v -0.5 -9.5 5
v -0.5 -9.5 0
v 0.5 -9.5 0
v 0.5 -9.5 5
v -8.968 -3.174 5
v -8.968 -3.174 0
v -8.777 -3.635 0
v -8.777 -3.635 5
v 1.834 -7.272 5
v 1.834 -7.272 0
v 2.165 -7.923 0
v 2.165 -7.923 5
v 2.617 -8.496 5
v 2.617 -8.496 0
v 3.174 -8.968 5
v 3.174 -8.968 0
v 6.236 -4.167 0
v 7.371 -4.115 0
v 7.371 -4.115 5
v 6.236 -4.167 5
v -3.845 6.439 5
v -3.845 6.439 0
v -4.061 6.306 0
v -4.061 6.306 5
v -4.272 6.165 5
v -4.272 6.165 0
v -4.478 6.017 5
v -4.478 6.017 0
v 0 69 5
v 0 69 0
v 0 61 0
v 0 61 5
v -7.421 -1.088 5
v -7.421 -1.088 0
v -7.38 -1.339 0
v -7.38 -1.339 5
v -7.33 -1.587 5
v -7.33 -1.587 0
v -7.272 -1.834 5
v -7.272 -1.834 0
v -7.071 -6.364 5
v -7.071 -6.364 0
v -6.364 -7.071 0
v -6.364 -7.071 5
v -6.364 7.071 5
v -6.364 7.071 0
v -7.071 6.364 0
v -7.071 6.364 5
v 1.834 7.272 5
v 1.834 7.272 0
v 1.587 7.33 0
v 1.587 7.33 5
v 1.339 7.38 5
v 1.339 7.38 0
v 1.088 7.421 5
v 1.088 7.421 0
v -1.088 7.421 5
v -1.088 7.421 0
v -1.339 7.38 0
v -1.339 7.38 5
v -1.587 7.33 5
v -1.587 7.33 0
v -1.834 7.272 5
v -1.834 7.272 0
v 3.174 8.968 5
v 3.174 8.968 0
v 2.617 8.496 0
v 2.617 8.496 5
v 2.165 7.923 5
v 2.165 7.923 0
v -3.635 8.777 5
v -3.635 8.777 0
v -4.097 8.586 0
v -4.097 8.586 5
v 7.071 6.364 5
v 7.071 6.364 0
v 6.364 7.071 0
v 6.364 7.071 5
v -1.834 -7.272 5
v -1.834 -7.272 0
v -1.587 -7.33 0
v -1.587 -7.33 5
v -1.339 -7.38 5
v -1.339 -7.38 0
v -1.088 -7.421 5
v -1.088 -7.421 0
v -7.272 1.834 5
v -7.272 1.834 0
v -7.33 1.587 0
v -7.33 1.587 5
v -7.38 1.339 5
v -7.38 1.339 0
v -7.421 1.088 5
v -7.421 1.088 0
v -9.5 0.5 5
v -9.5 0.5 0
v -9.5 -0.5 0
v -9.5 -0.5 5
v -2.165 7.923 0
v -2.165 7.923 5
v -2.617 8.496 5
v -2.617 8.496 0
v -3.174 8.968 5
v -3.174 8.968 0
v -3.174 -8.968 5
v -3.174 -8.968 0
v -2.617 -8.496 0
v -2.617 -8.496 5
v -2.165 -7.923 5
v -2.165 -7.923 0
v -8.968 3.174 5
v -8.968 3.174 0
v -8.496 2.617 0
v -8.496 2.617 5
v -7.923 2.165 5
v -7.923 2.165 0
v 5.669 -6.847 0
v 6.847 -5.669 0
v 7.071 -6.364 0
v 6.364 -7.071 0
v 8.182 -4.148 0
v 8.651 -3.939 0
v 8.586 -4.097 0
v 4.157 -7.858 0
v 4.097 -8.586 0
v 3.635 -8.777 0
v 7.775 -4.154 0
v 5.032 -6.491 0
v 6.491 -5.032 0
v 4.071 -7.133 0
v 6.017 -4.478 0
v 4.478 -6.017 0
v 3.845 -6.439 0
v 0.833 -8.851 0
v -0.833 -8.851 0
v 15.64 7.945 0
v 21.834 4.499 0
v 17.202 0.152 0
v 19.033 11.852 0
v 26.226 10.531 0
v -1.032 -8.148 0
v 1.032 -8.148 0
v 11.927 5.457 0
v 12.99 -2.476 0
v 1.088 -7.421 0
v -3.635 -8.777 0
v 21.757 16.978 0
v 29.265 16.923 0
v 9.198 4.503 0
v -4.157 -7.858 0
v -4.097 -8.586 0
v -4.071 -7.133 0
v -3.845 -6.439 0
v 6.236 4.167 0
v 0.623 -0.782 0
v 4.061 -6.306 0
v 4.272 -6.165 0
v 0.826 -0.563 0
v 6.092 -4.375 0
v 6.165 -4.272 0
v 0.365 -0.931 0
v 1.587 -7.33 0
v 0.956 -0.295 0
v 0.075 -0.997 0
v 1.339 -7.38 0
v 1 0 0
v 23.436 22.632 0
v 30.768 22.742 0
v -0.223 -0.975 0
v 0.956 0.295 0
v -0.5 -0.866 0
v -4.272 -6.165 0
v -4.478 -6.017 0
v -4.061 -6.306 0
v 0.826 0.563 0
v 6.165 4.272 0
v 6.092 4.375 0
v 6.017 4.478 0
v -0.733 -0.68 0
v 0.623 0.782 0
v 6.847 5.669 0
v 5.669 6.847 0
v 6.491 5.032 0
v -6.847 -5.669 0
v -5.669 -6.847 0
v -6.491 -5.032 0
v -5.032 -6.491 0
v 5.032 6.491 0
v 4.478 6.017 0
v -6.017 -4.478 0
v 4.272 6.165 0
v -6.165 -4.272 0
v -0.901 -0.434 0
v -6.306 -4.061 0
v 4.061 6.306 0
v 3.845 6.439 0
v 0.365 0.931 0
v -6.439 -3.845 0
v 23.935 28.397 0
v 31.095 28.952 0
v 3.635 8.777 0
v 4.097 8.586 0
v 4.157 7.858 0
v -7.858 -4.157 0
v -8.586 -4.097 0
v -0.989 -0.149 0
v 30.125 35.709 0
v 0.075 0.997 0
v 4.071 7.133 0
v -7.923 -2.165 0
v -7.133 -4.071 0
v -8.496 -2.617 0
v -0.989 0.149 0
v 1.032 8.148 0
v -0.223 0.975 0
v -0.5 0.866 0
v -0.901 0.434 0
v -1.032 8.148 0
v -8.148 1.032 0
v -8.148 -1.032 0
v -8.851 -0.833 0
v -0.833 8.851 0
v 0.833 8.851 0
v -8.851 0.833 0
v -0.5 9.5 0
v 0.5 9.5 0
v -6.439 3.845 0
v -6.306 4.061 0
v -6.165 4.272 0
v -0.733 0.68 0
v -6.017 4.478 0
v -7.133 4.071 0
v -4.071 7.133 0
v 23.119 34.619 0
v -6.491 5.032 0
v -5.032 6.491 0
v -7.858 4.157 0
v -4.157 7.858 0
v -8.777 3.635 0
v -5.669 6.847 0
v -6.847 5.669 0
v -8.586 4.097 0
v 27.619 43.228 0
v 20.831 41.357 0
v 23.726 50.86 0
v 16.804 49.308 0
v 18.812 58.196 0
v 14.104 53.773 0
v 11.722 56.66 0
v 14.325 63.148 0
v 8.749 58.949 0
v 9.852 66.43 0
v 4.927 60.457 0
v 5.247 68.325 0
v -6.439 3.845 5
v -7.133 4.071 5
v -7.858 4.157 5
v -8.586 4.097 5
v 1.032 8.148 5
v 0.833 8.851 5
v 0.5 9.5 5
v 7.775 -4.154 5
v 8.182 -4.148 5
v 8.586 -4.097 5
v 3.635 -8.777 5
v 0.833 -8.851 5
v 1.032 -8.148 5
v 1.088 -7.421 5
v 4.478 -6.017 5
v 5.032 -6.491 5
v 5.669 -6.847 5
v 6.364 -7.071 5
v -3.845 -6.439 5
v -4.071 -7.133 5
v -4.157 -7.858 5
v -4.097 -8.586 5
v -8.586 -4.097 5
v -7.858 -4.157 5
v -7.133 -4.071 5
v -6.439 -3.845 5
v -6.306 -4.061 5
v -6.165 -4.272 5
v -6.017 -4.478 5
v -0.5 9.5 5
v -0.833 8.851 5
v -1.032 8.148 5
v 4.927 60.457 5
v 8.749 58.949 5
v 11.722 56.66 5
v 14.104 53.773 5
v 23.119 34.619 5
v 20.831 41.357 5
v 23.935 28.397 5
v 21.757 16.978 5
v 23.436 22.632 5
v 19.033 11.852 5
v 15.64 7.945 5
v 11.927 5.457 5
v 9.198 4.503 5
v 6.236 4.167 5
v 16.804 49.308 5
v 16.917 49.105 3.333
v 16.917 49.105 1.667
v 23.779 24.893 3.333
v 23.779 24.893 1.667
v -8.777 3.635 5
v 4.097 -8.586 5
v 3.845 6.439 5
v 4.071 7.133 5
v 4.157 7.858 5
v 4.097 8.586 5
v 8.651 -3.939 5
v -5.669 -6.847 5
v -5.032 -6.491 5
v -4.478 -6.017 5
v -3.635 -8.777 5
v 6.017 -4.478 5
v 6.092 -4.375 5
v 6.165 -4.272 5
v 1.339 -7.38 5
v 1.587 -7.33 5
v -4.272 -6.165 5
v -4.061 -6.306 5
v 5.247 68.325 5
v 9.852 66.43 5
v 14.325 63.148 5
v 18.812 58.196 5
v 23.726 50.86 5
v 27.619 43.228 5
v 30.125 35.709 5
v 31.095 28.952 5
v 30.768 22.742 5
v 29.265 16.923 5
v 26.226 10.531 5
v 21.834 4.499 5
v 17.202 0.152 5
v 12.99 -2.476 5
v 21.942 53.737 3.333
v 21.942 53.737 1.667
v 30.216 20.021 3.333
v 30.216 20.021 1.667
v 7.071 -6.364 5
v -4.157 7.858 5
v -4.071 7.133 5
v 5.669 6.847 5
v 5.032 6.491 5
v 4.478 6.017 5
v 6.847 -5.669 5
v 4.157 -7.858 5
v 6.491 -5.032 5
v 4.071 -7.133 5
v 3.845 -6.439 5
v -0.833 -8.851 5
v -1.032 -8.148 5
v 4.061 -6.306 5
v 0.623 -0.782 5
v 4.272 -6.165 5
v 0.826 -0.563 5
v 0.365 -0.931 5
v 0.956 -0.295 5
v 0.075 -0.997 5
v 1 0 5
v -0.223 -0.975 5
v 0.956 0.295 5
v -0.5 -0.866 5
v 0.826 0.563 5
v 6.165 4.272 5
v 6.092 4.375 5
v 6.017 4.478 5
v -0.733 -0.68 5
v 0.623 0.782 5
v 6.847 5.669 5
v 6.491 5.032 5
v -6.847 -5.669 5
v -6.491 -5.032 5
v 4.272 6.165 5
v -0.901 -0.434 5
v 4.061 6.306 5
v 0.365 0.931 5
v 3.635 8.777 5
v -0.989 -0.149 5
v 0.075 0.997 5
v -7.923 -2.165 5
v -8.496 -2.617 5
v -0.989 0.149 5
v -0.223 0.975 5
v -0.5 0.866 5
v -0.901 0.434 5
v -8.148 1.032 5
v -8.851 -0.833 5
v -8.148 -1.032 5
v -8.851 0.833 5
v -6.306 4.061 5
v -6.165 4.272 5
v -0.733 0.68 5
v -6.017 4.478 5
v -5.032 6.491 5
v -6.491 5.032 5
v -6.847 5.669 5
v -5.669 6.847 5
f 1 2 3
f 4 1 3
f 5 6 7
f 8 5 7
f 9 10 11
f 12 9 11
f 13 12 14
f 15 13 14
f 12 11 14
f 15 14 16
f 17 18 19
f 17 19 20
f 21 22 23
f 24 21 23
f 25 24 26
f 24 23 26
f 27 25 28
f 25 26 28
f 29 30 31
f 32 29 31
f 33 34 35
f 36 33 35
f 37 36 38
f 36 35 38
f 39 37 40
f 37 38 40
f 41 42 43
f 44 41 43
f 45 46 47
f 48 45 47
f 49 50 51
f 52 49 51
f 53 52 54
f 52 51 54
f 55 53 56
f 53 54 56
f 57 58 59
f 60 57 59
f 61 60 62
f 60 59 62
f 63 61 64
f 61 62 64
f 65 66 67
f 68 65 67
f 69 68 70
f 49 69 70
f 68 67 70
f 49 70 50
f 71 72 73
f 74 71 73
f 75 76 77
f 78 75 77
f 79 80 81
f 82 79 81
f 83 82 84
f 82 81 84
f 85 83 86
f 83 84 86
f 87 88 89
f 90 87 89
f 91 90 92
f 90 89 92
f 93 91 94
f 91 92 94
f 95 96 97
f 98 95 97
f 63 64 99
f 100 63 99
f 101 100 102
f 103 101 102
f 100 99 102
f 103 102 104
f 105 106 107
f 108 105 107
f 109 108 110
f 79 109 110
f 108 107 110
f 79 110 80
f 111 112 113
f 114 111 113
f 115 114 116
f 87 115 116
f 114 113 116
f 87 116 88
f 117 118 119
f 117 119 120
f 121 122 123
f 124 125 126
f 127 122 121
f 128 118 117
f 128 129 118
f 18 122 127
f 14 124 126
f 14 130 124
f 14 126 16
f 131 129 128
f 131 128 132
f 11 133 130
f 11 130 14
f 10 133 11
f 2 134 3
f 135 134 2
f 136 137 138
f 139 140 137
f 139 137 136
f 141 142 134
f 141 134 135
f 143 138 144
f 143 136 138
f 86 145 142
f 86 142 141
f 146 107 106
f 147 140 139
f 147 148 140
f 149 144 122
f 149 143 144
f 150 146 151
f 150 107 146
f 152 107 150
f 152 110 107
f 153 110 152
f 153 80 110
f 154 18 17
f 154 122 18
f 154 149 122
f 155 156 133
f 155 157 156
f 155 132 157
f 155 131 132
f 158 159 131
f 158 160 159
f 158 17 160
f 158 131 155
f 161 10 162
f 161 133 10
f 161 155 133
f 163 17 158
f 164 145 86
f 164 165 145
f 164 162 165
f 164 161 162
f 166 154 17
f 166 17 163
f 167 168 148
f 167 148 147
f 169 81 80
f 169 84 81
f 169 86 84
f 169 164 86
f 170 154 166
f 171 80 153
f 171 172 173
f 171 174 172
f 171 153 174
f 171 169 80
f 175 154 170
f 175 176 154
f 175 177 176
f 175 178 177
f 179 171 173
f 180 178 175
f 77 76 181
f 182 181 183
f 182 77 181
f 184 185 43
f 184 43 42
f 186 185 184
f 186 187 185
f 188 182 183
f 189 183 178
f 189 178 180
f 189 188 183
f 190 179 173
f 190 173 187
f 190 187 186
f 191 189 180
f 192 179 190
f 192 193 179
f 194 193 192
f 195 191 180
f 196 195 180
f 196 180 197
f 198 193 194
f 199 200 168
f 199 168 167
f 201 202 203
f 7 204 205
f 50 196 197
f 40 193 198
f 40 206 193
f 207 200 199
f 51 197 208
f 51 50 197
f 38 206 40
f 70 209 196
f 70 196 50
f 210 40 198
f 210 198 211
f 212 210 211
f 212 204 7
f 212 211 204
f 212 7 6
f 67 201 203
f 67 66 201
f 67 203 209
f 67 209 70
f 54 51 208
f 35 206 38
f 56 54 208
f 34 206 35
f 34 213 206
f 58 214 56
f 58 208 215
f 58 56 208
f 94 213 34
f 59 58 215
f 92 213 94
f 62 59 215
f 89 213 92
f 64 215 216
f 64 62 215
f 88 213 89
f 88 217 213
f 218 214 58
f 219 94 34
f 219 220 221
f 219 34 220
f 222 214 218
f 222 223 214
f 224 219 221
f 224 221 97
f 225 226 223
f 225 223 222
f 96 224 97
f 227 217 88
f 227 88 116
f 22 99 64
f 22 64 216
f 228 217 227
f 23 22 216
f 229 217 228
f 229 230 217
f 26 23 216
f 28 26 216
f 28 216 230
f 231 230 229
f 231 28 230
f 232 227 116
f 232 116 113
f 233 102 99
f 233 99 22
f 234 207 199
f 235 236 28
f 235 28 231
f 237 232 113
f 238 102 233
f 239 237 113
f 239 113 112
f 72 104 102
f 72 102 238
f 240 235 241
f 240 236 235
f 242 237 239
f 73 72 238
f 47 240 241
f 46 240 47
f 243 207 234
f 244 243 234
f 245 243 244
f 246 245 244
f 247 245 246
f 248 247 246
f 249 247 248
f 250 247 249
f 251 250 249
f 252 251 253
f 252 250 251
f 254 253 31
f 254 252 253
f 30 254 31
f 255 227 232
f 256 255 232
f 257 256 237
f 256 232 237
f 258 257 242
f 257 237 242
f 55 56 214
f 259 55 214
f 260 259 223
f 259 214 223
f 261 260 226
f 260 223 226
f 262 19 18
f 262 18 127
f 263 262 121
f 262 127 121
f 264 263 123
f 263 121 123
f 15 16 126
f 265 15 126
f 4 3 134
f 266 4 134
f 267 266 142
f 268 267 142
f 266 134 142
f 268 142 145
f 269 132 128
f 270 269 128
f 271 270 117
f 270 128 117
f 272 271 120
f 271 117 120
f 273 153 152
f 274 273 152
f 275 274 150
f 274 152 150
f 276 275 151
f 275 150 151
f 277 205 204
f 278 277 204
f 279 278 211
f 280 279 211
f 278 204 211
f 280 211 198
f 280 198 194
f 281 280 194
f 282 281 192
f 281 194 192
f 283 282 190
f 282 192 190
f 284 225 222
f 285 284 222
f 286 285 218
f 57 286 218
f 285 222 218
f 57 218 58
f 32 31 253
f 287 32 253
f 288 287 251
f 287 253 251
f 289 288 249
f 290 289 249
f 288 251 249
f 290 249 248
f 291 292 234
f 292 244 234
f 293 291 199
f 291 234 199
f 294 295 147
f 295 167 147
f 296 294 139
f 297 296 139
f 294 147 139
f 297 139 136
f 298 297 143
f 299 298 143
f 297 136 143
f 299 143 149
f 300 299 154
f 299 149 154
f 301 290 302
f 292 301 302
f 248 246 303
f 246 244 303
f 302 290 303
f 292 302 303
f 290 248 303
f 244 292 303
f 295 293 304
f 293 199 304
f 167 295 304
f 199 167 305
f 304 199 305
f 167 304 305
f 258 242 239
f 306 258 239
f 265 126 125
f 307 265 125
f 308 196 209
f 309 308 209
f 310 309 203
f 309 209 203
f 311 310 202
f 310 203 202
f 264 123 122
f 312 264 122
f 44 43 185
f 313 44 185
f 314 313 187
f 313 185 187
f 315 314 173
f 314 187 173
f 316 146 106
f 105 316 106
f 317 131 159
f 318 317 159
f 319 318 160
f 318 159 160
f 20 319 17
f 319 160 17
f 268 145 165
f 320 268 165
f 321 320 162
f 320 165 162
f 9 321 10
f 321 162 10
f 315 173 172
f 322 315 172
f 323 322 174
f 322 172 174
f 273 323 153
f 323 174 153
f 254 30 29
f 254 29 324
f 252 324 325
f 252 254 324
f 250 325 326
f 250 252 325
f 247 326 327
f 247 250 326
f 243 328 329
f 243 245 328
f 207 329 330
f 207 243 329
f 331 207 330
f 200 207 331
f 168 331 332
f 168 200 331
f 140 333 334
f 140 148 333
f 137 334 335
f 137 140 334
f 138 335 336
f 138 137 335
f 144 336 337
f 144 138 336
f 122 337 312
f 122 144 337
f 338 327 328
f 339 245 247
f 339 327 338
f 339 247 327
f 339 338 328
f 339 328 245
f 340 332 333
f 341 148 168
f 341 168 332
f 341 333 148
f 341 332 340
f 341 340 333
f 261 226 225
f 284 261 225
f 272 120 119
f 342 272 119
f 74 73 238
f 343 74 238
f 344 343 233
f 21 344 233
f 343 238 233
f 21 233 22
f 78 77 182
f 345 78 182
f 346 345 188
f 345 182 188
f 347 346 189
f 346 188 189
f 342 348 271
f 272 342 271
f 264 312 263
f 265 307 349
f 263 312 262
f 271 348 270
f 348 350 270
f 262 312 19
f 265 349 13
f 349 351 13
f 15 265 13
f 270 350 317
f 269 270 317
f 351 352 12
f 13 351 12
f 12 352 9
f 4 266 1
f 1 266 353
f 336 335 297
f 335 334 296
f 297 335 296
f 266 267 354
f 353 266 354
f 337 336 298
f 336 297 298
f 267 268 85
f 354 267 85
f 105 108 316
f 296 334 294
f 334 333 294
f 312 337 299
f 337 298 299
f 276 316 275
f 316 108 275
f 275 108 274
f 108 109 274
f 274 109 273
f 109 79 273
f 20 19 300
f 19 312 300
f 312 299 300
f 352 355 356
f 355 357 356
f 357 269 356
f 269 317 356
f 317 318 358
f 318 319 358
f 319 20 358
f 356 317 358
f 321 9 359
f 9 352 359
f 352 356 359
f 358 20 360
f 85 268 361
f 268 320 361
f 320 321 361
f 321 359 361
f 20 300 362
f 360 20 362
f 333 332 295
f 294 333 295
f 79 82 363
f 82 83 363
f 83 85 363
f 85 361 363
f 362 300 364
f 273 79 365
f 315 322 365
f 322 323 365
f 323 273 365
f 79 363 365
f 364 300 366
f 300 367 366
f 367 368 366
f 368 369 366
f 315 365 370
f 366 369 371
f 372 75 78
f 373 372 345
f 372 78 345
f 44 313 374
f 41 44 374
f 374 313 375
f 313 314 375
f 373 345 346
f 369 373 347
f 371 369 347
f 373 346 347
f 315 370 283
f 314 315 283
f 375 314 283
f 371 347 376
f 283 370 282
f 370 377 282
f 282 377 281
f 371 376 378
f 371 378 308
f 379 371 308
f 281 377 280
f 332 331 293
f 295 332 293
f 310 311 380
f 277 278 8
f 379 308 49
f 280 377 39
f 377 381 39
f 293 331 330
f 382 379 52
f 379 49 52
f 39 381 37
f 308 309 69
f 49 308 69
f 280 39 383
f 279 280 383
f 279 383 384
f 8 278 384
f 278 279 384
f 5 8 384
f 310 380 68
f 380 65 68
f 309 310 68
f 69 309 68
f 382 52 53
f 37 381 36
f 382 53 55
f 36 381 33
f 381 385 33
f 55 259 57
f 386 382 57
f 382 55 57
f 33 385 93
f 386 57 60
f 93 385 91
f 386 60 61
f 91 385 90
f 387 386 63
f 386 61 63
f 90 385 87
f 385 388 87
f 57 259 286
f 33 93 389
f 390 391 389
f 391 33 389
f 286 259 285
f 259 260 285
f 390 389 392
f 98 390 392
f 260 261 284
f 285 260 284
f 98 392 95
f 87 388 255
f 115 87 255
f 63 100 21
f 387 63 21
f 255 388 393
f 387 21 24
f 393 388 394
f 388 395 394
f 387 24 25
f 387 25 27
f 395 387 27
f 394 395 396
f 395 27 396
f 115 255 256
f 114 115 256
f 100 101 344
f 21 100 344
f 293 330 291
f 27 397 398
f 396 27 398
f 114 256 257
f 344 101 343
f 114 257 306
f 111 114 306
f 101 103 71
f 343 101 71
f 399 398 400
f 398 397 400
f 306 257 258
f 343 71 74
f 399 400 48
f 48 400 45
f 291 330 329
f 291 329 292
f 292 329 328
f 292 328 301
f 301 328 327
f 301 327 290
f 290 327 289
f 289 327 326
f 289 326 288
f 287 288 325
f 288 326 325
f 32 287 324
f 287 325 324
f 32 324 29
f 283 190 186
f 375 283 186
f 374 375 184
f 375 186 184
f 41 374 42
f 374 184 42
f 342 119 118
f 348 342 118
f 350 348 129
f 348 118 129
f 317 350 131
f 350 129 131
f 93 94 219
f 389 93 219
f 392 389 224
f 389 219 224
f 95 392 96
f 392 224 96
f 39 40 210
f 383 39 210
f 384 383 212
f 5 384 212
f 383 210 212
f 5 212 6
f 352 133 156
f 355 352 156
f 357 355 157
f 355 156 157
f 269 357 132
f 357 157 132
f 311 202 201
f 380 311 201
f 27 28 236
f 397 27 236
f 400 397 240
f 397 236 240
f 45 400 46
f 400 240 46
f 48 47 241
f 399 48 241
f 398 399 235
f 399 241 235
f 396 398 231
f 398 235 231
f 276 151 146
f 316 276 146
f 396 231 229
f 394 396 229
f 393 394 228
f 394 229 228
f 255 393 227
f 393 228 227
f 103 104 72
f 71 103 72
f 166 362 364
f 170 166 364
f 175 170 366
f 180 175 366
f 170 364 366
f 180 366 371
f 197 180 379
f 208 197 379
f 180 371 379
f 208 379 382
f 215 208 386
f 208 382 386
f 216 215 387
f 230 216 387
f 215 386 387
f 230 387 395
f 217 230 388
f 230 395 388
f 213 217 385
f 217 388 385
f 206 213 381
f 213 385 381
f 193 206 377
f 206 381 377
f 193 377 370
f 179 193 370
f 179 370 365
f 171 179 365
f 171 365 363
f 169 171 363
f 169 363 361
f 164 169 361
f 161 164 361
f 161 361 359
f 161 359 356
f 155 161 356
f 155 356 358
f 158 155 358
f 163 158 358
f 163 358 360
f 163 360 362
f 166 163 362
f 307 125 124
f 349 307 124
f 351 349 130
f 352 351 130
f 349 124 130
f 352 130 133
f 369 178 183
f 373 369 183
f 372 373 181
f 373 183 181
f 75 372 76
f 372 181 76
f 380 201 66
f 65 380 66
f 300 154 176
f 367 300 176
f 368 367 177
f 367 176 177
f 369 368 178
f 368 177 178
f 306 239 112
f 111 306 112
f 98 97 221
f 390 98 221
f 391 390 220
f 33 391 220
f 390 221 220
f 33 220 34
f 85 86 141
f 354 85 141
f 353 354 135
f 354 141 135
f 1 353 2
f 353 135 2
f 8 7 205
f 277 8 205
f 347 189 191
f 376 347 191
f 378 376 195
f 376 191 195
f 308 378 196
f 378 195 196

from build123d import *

# Parameters (mm, degrees)
F1_DEPTH = 5
F2_R     = 1
F3_DEPTH = 5.001
F5_DEPTH = 5


with BuildPart() as f1:
    # F0 (on Top) → F1 (new body)
    with BuildSketch(Plane.XY):
        with BuildLine():
            ThreePointArc((7.4206173165, -1.0883191822), (7.4801280027, -0.5456052265), (7.5, 0))
            ThreePointArc((7.5, 0), (7.4801280027, 0.5456052265), (7.4206173165, 1.0883191822))
            ThreePointArc((7.4206173165, 1.0883191822), (7.355889603, 1.4631774151), (7.2722381774, 1.8342714877))
            ThreePointArc((7.2722381774, 1.8342714877), (6.9290964938, 2.8701257427), (6.4392747372, 3.8452231222))
            ThreePointArc((6.4392747372, 3.8452231222), (6.2360220923, 4.1667767476), (6.0167266989, 4.4776109513))
            ThreePointArc((6.0167266989, 4.4776109513), (5.3033008589, 5.3033008589), (4.4776109513, 6.0167266989))
            ThreePointArc((4.4776109513, 6.0167266989), (4.1667767476, 6.2360220923), (3.8452231222, 6.4392747372))
            ThreePointArc((3.8452231222, 6.4392747372), (2.8701257427, 6.9290964938), (1.8342714877, 7.2722381774))
            ThreePointArc((1.8342714877, 7.2722381774), (1.4631774151, 7.355889603), (1.0883191822, 7.4206173165))
            ThreePointArc((1.0883191822, 7.4206173165), (0, 7.5), (-1.0883191822, 7.4206173165))
            ThreePointArc((-1.0883191822, 7.4206173165), (-1.4631774151, 7.355889603), (-1.8342714877, 7.2722381774))
            ThreePointArc((-1.8342714877, 7.2722381774), (-2.8701257427, 6.9290964938), (-3.8452231222, 6.4392747372))
            ThreePointArc((-3.8452231222, 6.4392747372), (-4.1667767476, 6.2360220923), (-4.4776109513, 6.0167266989))
            ThreePointArc((-4.4776109513, 6.0167266989), (-5.3033008589, 5.3033008589), (-6.0167266989, 4.4776109513))
            ThreePointArc((-6.0167266989, 4.4776109513), (-6.2360220923, 4.1667767476), (-6.4392747372, 3.8452231222))
            ThreePointArc((-6.4392747372, 3.8452231222), (-6.9290964938, 2.8701257427), (-7.2722381774, 1.8342714877))
            ThreePointArc((-7.2722381774, 1.8342714877), (-7.355889603, 1.4631774151), (-7.4206173165, 1.0883191822))
            ThreePointArc((-7.4206173165, 1.0883191822), (-7.5, 0), (-7.4206173165, -1.0883191822))
            ThreePointArc((-7.4206173165, -1.0883191822), (-7.355889603, -1.4631774151), (-7.2722381774, -1.8342714877))
            ThreePointArc((-7.2722381774, -1.8342714877), (-6.9290964938, -2.8701257427), (-6.4392747372, -3.8452231222))
            ThreePointArc((-6.4392747372, -3.8452231222), (-6.2360220923, -4.1667767476), (-6.0167266989, -4.4776109513))
            ThreePointArc((-6.0167266989, -4.4776109513), (-5.3033008589, -5.3033008589), (-4.4776109513, -6.0167266989))
            ThreePointArc((-4.4776109513, -6.0167266989), (-4.1667767476, -6.2360220923), (-3.8452231222, -6.4392747372))
            ThreePointArc((-3.8452231222, -6.4392747372), (-2.8701257427, -6.9290964938), (-1.8342714877, -7.2722381774))
            ThreePointArc((-1.8342714877, -7.2722381774), (-1.4631774151, -7.355889603), (-1.0883191822, -7.4206173165))
            ThreePointArc((-1.0883191822, -7.4206173165), (0, -7.5), (1.0883191822, -7.4206173165))
            ThreePointArc((1.0883191822, -7.4206173165), (1.4631774151, -7.355889603), (1.8342714877, -7.2722381774))
            ThreePointArc((1.8342714877, -7.2722381774), (2.8701257427, -6.9290964938), (3.8452231222, -6.4392747372))
            ThreePointArc((3.8452231222, -6.4392747372), (4.1667767476, -6.2360220923), (4.4776109513, -6.0167266989))
            ThreePointArc((4.4776109513, -6.0167266989), (5.3033008589, -5.3033008589), (6.0167266989, -4.4776109513))
            ThreePointArc((6.0167266989, -4.4776109513), (6.2360220923, -4.1667767476), (6.4392747372, -3.8452231222))
            ThreePointArc((6.4392747372, -3.8452231222), (6.9290964938, -2.8701257427), (7.2722381774, -1.8342714877))
            ThreePointArc((7.2722381774, -1.8342714877), (7.355889603, -1.4631774151), (7.4206173165, -1.0883191822))
        make_face()
        with BuildLine():
            ThreePointArc((7.4206173165, 1.0883191822), (7.4801280027, 0.5456052265), (7.5, 0))
            ThreePointArc((7.5, 0), (7.4801280027, -0.5456052265), (7.4206173165, -1.0883191822))
            ThreePointArc((7.4206173165, -1.0883191822), (8.5043518229, -0.9498278009), (9.5, -0.5))
            Line((9.5, -0.5), (9.5, 0))
            Line((9.5, 0), (9.5, 0.5))
            ThreePointArc((9.5, 0.5), (8.5043518229, 0.9498278009), (7.4206173165, 1.0883191822))
        make_face()
        with BuildLine():
            ThreePointArc((6.4392747372, 3.8452231222), (6.9290964938, 2.8701257427), (7.2722381774, 1.8342714877))
            ThreePointArc((7.2722381774, 1.8342714877), (8.2204799494, 2.376948081), (8.968197275, 3.1735528412))
            Line((8.968197275, 3.1735528412), (8.7768555589, 3.6354926075))
            Line((8.7768555589, 3.6354926075), (8.5855138427, 4.0974323737))
            ThreePointArc((8.5855138427, 4.0974323737), (7.4935132234, 4.1320010103), (6.4392747372, 3.8452231222))
        make_face()
        with BuildLine():
            ThreePointArc((8.968197275, -3.1735528412), (8.2204799494, -2.376948081), (7.2722381774, -1.8342714877))
            ThreePointArc((7.2722381774, -1.8342714877), (6.9290964938, -2.8701257427), (6.4392747372, -3.8452231222))
            ThreePointArc((6.4392747372, -3.8452231222), (7.4935132234, -4.1320010103), (8.5855138427, -4.0974323737))
            Line((8.5855138427, -4.0974323737), (8.7768555589, -3.6354926075))
            Line((8.7768555589, -3.6354926075), (8.968197275, -3.1735528412))
        make_face()
        with BuildLine():
            ThreePointArc((4.4776109513, 6.0167266989), (5.3033008589, 5.3033008589), (6.0167266989, 4.4776109513))
            ThreePointArc((6.0167266989, 4.4776109513), (6.6851145225, 5.3418551646), (7.0710678119, 6.3639610307))
            Line((7.0710678119, 6.3639610307), (6.7175144213, 6.7175144213))
            Line((6.7175144213, 6.7175144213), (6.3639610307, 7.0710678119))
            ThreePointArc((6.3639610307, 7.0710678119), (5.3418551646, 6.6851145225), (4.4776109513, 6.0167266989))
        make_face()
        with BuildLine():
            ThreePointArc((7.0710678119, -6.3639610307), (6.6851145225, -5.3418551646), (6.0167266989, -4.4776109513))
            ThreePointArc((6.0167266989, -4.4776109513), (5.3033008589, -5.3033008589), (4.4776109513, -6.0167266989))
            ThreePointArc((4.4776109513, -6.0167266989), (5.3418551646, -6.6851145225), (6.3639610307, -7.0710678119))
            Line((6.3639610307, -7.0710678119), (6.7175144213, -6.7175144213))
            Line((6.7175144213, -6.7175144213), (7.0710678119, -6.3639610307))
        make_face()
        with BuildLine():
            ThreePointArc((1.8342714877, 7.2722381774), (2.8701257427, 6.9290964938), (3.8452231222, 6.4392747372))
            ThreePointArc((3.8452231222, 6.4392747372), (4.1320010103, 7.4935132234), (4.0974323737, 8.5855138427))
            Line((4.0974323737, 8.5855138427), (3.6354926075, 8.7768555589))
            Line((3.6354926075, 8.7768555589), (3.1735528412, 8.968197275))
            ThreePointArc((3.1735528412, 8.968197275), (2.376948081, 8.2204799494), (1.8342714877, 7.2722381774))
        make_face()
        with BuildLine():
            ThreePointArc((4.0974323737, -8.5855138427), (4.1320010103, -7.4935132234), (3.8452231222, -6.4392747372))
            ThreePointArc((3.8452231222, -6.4392747372), (2.8701257427, -6.9290964938), (1.8342714877, -7.2722381774))
            ThreePointArc((1.8342714877, -7.2722381774), (2.376948081, -8.2204799494), (3.1735528412, -8.968197275))
            Line((3.1735528412, -8.968197275), (3.6354926075, -8.7768555589))
            Line((3.6354926075, -8.7768555589), (4.0974323737, -8.5855138427))
        make_face()
        with BuildLine():
            ThreePointArc((-1.0883191822, 7.4206173165), (0, 7.5), (1.0883191822, 7.4206173165))
            ThreePointArc((1.0883191822, 7.4206173165), (0.9498278009, 8.5043518229), (0.5, 9.5))
            Line((0.5, 9.5), (0, 9.5))
            Line((0, 9.5), (-0.5, 9.5))
            ThreePointArc((-0.5, 9.5), (-0.9498278009, 8.5043518229), (-1.0883191822, 7.4206173165))
        make_face()
        with BuildLine():
            ThreePointArc((0.5, -9.5), (0.9498278009, -8.5043518229), (1.0883191822, -7.4206173165))
            ThreePointArc((1.0883191822, -7.4206173165), (0, -7.5), (-1.0883191822, -7.4206173165))
            ThreePointArc((-1.0883191822, -7.4206173165), (-0.9498278009, -8.5043518229), (-0.5, -9.5))
            Line((-0.5, -9.5), (0, -9.5))
            Line((0, -9.5), (0.5, -9.5))
        make_face()
        with BuildLine():
            ThreePointArc((-3.8452231222, 6.4392747372), (-2.8701257427, 6.9290964938), (-1.8342714877, 7.2722381774))
            ThreePointArc((-1.8342714877, 7.2722381774), (-2.376948081, 8.2204799494), (-3.1735528412, 8.968197275))
            Line((-3.1735528412, 8.968197275), (-3.6354926075, 8.7768555589))
            Line((-3.6354926075, 8.7768555589), (-4.0974323737, 8.5855138427))
            ThreePointArc((-4.0974323737, 8.5855138427), (-4.1320010103, 7.4935132234), (-3.8452231222, 6.4392747372))
        make_face()
        with BuildLine():
            ThreePointArc((-3.1735528412, -8.968197275), (-2.376948081, -8.2204799494), (-1.8342714877, -7.2722381774))
            ThreePointArc((-1.8342714877, -7.2722381774), (-2.8701257427, -6.9290964938), (-3.8452231222, -6.4392747372))
            ThreePointArc((-3.8452231222, -6.4392747372), (-4.1320010103, -7.4935132234), (-4.0974323737, -8.5855138427))
            Line((-4.0974323737, -8.5855138427), (-3.6354926075, -8.7768555589))
            Line((-3.6354926075, -8.7768555589), (-3.1735528412, -8.968197275))
        make_face()
        with BuildLine():
            ThreePointArc((-6.0167266989, 4.4776109513), (-5.3033008589, 5.3033008589), (-4.4776109513, 6.0167266989))
            ThreePointArc((-4.4776109513, 6.0167266989), (-5.3418551646, 6.6851145225), (-6.3639610307, 7.0710678119))
            Line((-6.3639610307, 7.0710678119), (-6.7175144213, 6.7175144213))
            Line((-6.7175144213, 6.7175144213), (-7.0710678119, 6.3639610307))
            ThreePointArc((-7.0710678119, 6.3639610307), (-6.6851145225, 5.3418551646), (-6.0167266989, 4.4776109513))
        make_face()
        with BuildLine():
            ThreePointArc((-6.3639610307, -7.0710678119), (-5.3418551646, -6.6851145225), (-4.4776109513, -6.0167266989))
            ThreePointArc((-4.4776109513, -6.0167266989), (-5.3033008589, -5.3033008589), (-6.0167266989, -4.4776109513))
            ThreePointArc((-6.0167266989, -4.4776109513), (-6.6851145225, -5.3418551646), (-7.0710678119, -6.3639610307))
            Line((-7.0710678119, -6.3639610307), (-6.7175144213, -6.7175144213))
            Line((-6.7175144213, -6.7175144213), (-6.3639610307, -7.0710678119))
        make_face()
        with BuildLine():
            ThreePointArc((-7.2722381774, 1.8342714877), (-6.9290964938, 2.8701257427), (-6.4392747372, 3.8452231222))
            ThreePointArc((-6.4392747372, 3.8452231222), (-7.4935132234, 4.1320010103), (-8.5855138427, 4.0974323737))
            Line((-8.5855138427, 4.0974323737), (-8.7768555589, 3.6354926075))
            Line((-8.7768555589, 3.6354926075), (-8.968197275, 3.1735528412))
            ThreePointArc((-8.968197275, 3.1735528412), (-8.2204799494, 2.376948081), (-7.2722381774, 1.8342714877))
        make_face()
        with BuildLine():
            ThreePointArc((-8.5855138427, -4.0974323737), (-7.4935132234, -4.1320010103), (-6.4392747372, -3.8452231222))
            ThreePointArc((-6.4392747372, -3.8452231222), (-6.9290964938, -2.8701257427), (-7.2722381774, -1.8342714877))
            ThreePointArc((-7.2722381774, -1.8342714877), (-8.2204799494, -2.376948081), (-8.968197275, -3.1735528412))
            Line((-8.968197275, -3.1735528412), (-8.7768555589, -3.6354926075))
            Line((-8.7768555589, -3.6354926075), (-8.5855138427, -4.0974323737))
        make_face()
        with BuildLine():
            ThreePointArc((-7.4206173165, -1.0883191822), (-7.5, 0), (-7.4206173165, 1.0883191822))
            ThreePointArc((-7.4206173165, 1.0883191822), (-8.5043518229, 0.9498278009), (-9.5, 0.5))
            Line((-9.5, 0.5), (-9.5, 0))
            Line((-9.5, 0), (-9.5, -0.5))
            ThreePointArc((-9.5, -0.5), (-8.5043518229, -0.9498278009), (-7.4206173165, -1.0883191822))
        make_face()
    extrude(amount=F1_DEPTH)

    # F2 (on face) → F3 (cut, through all)
    with BuildSketch(Plane.XY.offset(5)):
        Circle(F2_R)
    extrude(amount=-F3_DEPTH, mode=Mode.SUBTRACT)

    # F4 (on Top) → F5 (join, through all)
    with BuildSketch(Plane.XY):
        with BuildLine():
            add(Edge.make_bspline(
                [(0, 69), (10, 69), (23.7810131415, 54.517068575), (38.2659269705, 20.3271174858), (16.2360220923, -4.1667767476), (6.2360220923, -4.1667767476)],
                knots=[0, 0, 0, 0, 0.3059494361, 0.6546300561, 1, 1, 1, 1], degree=3))
            Line((0, 69), (0, 61))
            add(Edge.make_bspline(
                [(0, 61), (10, 61), (17.158997377, 49.3115106265), (28.9620106824, 25.9258319124), (16.2360220923, 4.1667767476), (6.2360220923, 4.1667767476)],
                knots=[0, 0, 0, 0, 0.3077865037, 0.6473114919, 1, 1, 1, 1], degree=3))
            Line((6.2360220923, 4.1667767476), (6.2360220923, -4.1667767476))
        make_face()
    extrude(amount=F5_DEPTH)


solid = f1.part
